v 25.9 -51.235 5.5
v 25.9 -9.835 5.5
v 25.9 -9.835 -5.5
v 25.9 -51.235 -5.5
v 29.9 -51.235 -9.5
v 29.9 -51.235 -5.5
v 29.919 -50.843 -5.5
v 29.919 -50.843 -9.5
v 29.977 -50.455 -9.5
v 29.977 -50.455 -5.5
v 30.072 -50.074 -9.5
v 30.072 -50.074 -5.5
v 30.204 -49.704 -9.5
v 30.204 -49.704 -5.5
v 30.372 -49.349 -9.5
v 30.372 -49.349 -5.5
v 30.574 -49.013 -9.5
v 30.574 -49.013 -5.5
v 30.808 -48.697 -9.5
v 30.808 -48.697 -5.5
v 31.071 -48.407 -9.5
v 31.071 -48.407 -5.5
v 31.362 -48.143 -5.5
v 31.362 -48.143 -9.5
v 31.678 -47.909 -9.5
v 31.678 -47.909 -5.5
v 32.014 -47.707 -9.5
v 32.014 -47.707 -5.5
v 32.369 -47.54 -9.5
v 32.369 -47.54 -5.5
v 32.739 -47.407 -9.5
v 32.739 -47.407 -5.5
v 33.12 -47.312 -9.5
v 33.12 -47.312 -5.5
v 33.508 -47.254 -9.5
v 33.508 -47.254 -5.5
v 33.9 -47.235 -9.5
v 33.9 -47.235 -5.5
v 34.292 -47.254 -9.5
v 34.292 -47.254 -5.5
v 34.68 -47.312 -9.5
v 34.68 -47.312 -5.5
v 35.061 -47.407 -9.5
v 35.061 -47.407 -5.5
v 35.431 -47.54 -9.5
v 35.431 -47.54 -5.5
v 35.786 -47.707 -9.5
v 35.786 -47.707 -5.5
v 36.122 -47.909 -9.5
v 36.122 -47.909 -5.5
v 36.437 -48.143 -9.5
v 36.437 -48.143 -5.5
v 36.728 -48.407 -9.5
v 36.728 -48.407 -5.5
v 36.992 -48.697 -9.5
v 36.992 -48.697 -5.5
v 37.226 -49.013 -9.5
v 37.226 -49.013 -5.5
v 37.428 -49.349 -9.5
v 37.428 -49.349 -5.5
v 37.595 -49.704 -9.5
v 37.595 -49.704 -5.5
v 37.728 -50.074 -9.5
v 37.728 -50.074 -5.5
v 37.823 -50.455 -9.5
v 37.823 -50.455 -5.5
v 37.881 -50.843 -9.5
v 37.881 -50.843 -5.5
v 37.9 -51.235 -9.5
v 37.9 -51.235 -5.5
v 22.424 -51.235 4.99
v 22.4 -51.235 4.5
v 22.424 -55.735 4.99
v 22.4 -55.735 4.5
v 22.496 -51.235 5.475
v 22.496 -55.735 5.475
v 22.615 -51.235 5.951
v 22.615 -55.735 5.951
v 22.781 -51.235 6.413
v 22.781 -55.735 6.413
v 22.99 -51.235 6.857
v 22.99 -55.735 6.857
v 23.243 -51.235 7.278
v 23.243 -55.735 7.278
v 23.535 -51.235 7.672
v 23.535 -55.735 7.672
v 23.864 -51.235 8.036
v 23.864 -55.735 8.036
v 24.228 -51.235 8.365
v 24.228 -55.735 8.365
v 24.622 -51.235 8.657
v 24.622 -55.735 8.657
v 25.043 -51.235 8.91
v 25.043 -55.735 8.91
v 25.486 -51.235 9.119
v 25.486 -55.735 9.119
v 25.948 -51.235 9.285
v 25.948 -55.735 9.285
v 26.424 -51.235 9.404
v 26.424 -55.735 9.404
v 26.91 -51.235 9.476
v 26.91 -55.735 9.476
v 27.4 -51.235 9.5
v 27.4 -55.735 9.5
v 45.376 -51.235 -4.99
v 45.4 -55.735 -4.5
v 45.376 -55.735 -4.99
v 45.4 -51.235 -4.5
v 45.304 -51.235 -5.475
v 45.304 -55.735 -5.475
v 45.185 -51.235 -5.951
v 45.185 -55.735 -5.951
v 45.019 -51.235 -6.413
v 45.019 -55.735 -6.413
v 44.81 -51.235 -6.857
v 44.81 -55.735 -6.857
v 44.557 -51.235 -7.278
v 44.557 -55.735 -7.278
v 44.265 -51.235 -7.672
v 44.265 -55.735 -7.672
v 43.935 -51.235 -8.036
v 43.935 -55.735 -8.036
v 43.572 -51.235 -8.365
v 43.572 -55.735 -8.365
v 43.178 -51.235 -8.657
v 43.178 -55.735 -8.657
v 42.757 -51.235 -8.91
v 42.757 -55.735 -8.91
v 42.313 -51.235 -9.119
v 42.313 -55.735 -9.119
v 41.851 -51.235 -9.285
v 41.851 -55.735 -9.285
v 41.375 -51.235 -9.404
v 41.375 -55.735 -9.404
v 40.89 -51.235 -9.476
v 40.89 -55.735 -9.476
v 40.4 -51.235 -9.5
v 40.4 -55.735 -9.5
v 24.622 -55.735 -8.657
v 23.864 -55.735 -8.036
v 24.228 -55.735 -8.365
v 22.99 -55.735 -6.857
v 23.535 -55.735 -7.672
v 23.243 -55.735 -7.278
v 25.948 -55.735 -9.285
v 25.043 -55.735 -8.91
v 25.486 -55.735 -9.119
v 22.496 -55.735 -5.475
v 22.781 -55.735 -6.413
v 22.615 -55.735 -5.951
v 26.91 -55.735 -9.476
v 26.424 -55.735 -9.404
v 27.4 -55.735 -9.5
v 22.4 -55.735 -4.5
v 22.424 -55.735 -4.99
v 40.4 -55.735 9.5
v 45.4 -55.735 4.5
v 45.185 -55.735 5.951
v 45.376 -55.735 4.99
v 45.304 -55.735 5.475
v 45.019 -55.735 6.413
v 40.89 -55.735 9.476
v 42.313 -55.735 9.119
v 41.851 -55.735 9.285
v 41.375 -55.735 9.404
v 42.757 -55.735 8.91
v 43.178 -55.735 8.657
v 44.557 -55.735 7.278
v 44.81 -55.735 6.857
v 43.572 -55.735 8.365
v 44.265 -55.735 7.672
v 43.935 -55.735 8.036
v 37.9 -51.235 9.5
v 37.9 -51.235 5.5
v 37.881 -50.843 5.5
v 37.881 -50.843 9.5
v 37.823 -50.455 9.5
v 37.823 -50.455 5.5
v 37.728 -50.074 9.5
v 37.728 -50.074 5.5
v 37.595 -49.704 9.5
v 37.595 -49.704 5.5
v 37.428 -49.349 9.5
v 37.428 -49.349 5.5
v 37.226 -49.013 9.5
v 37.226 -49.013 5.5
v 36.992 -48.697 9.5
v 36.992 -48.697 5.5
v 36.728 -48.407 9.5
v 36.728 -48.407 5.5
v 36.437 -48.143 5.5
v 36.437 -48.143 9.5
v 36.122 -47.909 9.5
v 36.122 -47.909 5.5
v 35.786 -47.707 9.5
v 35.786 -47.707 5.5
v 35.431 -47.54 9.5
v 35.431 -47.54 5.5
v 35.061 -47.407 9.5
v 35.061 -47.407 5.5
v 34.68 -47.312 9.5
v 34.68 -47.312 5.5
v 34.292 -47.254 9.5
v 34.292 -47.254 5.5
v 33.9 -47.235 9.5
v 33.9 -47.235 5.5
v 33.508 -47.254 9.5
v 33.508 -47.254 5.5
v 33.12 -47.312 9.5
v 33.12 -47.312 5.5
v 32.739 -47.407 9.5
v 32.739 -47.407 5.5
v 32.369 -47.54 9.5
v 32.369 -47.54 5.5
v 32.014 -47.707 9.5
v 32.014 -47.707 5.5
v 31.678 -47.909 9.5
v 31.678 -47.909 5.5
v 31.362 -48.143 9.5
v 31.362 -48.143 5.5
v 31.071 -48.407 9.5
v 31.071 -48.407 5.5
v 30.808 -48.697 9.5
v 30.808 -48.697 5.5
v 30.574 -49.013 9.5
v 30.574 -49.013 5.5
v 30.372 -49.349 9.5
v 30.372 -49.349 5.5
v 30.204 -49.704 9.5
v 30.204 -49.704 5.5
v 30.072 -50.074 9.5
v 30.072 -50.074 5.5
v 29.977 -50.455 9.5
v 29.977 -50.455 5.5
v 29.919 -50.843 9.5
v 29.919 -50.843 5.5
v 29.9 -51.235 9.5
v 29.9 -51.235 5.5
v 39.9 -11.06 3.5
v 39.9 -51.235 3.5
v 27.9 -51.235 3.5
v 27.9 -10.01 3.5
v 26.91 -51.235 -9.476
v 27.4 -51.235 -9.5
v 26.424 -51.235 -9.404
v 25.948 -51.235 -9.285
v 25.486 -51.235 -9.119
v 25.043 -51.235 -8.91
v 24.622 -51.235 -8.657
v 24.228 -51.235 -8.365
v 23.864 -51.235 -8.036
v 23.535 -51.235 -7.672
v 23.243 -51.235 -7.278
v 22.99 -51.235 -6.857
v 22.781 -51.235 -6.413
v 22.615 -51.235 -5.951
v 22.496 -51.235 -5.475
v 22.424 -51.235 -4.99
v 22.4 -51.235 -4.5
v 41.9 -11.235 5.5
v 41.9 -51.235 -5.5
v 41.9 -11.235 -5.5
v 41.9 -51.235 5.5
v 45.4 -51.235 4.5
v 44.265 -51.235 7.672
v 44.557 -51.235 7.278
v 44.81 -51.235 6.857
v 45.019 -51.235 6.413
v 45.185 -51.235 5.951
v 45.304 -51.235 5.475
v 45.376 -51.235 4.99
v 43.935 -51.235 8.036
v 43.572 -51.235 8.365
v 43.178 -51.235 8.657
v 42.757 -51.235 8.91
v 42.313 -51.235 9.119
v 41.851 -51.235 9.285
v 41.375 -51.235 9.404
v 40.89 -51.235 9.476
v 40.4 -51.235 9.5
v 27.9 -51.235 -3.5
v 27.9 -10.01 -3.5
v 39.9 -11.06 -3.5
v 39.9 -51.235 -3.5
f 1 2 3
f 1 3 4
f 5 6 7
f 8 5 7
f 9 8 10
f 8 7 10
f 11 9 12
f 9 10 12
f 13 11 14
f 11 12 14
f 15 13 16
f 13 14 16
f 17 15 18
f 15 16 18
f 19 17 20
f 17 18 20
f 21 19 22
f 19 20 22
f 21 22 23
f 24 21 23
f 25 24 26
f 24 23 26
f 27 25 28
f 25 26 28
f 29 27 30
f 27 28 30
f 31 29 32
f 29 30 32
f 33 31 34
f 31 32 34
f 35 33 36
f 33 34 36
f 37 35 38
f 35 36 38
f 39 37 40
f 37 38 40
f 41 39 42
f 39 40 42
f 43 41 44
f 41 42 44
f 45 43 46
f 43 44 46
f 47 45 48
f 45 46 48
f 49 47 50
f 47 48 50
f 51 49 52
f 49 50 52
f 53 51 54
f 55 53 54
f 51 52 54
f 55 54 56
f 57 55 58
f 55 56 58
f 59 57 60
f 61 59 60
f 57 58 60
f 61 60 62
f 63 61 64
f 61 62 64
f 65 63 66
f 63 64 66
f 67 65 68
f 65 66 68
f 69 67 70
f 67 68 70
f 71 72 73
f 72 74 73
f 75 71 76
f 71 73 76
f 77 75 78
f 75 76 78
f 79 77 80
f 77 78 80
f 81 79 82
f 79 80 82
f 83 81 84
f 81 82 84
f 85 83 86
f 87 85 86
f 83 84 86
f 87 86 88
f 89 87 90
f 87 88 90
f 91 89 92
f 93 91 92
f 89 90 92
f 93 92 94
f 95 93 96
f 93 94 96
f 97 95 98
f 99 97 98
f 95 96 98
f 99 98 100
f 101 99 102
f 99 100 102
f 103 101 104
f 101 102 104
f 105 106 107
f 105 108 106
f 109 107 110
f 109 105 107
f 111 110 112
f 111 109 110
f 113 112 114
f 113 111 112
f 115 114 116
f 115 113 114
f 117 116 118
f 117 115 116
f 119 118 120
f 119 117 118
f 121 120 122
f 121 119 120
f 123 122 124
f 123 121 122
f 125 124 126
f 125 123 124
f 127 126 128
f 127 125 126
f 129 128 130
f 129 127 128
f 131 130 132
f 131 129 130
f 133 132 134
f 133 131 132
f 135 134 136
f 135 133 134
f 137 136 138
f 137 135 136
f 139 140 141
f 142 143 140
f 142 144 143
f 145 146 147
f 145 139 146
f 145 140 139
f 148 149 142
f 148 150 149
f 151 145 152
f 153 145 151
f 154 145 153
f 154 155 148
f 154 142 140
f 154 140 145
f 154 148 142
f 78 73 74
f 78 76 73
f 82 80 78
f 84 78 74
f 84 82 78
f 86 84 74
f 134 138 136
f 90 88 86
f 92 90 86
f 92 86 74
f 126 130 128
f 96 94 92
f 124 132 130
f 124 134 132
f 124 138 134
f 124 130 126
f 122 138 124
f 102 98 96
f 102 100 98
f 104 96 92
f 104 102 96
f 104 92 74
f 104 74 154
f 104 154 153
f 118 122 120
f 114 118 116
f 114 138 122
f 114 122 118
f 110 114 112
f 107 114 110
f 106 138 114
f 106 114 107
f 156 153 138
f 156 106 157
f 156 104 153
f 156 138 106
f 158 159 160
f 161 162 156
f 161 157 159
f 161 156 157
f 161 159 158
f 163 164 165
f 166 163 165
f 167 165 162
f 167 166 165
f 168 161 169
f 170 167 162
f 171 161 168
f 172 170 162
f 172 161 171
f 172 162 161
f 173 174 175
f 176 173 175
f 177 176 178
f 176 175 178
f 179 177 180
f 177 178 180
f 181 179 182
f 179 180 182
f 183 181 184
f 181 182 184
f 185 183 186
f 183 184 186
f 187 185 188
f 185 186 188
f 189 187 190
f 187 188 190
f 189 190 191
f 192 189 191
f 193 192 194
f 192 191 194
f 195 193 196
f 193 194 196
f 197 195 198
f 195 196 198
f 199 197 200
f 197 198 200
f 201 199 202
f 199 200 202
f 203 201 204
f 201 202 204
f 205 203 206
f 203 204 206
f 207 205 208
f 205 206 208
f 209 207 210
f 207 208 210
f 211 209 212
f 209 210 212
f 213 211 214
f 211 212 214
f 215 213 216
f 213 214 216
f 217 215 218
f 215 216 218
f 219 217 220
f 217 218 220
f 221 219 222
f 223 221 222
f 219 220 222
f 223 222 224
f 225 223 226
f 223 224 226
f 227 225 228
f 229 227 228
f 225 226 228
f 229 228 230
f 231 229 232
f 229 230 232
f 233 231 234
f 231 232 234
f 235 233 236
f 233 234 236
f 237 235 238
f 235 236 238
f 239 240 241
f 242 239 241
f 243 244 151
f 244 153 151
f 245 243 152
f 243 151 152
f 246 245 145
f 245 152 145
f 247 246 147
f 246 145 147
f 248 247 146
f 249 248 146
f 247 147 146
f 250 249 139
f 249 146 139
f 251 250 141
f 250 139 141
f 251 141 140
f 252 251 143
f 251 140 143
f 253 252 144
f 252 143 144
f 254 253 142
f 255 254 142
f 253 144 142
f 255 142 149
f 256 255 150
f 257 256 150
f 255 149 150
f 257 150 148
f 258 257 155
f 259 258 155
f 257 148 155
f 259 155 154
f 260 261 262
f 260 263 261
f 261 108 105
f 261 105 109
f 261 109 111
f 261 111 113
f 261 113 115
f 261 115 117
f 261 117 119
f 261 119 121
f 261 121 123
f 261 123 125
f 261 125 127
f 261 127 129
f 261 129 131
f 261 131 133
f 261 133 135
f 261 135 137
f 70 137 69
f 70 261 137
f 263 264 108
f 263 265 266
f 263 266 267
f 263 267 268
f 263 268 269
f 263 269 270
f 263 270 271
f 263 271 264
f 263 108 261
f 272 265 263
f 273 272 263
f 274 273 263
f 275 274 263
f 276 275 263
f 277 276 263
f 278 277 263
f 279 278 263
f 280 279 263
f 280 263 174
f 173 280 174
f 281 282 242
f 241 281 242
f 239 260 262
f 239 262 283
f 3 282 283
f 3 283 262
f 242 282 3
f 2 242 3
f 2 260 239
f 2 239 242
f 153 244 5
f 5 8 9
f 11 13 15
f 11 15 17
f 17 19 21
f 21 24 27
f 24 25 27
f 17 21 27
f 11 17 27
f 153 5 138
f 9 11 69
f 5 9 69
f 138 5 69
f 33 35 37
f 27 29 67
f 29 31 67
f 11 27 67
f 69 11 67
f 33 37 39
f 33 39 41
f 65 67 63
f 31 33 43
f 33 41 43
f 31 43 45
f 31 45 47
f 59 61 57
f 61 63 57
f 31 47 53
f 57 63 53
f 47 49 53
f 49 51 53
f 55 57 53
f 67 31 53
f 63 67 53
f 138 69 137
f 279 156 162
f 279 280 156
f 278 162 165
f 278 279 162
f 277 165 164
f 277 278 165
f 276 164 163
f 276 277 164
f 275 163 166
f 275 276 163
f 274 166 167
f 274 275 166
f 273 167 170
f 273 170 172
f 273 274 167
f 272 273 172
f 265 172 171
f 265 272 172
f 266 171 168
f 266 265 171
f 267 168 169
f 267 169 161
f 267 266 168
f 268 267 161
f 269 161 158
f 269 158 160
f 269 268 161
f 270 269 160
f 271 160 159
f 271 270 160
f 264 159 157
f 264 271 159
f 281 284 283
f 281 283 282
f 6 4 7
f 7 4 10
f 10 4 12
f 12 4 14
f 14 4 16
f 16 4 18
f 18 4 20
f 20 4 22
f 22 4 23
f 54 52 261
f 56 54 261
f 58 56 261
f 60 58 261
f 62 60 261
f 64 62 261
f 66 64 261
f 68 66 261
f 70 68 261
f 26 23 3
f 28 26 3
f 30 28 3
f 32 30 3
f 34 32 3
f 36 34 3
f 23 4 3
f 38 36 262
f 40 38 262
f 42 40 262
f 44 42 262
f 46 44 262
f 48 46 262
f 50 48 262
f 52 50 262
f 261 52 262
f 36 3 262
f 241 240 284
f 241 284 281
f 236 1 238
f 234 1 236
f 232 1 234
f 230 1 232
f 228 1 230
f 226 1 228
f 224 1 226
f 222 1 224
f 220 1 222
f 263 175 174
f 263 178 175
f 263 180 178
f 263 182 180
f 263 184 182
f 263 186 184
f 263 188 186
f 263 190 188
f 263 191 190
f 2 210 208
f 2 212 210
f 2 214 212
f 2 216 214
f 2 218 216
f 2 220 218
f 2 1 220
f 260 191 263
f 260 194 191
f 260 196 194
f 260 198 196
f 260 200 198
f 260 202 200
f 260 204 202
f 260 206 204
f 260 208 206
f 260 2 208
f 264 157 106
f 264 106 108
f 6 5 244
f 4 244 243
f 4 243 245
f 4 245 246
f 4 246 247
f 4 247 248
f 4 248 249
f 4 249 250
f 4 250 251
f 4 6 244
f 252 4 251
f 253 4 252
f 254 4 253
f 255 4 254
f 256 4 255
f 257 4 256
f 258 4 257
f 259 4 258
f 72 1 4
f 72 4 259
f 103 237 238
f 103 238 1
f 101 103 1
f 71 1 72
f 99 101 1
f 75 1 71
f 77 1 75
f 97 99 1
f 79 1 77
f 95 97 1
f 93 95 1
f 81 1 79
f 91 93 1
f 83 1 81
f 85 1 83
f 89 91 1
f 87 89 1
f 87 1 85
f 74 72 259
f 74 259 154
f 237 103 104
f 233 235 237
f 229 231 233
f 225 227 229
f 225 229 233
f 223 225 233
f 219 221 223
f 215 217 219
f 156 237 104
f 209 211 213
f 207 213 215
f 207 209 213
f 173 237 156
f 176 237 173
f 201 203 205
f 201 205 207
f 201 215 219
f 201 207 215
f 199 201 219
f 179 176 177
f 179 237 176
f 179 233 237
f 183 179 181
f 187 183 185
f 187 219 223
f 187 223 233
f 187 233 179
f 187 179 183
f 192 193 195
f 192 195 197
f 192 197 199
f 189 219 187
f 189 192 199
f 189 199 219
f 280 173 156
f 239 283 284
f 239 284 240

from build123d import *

# Parameters (mm, degrees)
F1_DEPTH = 5.5
F2_DEPTH = 9.5
F3_W     = 12
F3_H     = 7
F4_DEPTH = 44.1
F6_DEPTH = 4
F8_DEPTH = 4
F9_R     = 5
F10_R    = 5
F11_R    = 5
F12_R    = 5


# Not quite as in the source:
# - a feature names something its author has since deleted; it is built from what else it names


with BuildPart() as f1:
    # F0 (on Top) → F1 (new body, symmetric)
    with BuildSketch(Plane.XY):
        Polygon((41.8999169252, -11.2350502836), (25.8999169252, -9.8352316672), (25.8999169252, -51.2350502836), (41.8999169252, -51.2350502836), align=None)
    extrude(amount=F1_DEPTH, both=True)

    # F0 (on Top) → F2 (join, symmetric)
    with BuildSketch(Plane.XY):
        Polygon((41.8999169252, -51.2350502836), (25.8999169252, -51.2350502836), (22.3999169252, -51.2350502836), (22.3999169252, -55.7350502836), (45.3999169252, -55.7350502836), (45.3999169252, -51.2350502836), align=None)
    extrude(amount=F2_DEPTH, both=True)

    # F3 (on face) → F4 (cut)
    with BuildSketch(Plane(origin=(0, -51.2350502836, 0), x_dir=(-1, 0, 0), z_dir=(0, 1, 0))):
        with Locations((-33.8999169252, 0)):
            Rectangle(F3_W, F3_H)
    extrude(amount=F4_DEPTH, mode=Mode.SUBTRACT)

    # F5 (on face) → F6 (join)
    with BuildSketch(Plane.XY.offset(5.5)):
        with BuildLine():
            Line((29.8999169252, -51.2350502836), (37.8999169252, -51.2350502836))
            ThreePointArc((37.8999169252, -51.2350502836), (33.8999169252, -47.2350502836), (29.8999169252, -51.2350502836))
        make_face()
    extrude(amount=F6_DEPTH)

    # F7 (on face) → F8 (join)
    with BuildSketch(Plane(origin=(0, 0, -5.5), x_dir=(1, 0, 0), z_dir=(0, 0, -1))):
        with BuildLine():
            ThreePointArc((29.8999169252, 51.2350502836), (33.8999169252, 47.2350502836), (37.8999169252, 51.2350502836))
            Line((37.8999169252, 51.2350502836), (29.8999169252, 51.2350502836))
        make_face()
    extrude(amount=F8_DEPTH)

    # F9
    f9_edges = [f1.edges().sort_by_distance(p)[0] for p in [
        (22.399917, -53.48505, 9.5),
    ]]
    fillet(f9_edges, radius=F9_R)

    # F10
    f10_edges = [f1.edges().sort_by_distance(p)[0] for p in [
        (45.399917, -53.48505, 9.5),
    ]]
    fillet(f10_edges, radius=F10_R)

    # F11
    f11_edges = [f1.edges().sort_by_distance(p)[0] for p in [
        (45.399917, -53.48505, -9.5),
    ]]
    fillet(f11_edges, radius=F11_R)

    # F12
    f12_edges = [f1.edges().sort_by_distance(p)[0] for p in [
        (22.399917, -53.48505, -9.5),
    ]]
    fillet(f12_edges, radius=F12_R)


solid = f1.part
